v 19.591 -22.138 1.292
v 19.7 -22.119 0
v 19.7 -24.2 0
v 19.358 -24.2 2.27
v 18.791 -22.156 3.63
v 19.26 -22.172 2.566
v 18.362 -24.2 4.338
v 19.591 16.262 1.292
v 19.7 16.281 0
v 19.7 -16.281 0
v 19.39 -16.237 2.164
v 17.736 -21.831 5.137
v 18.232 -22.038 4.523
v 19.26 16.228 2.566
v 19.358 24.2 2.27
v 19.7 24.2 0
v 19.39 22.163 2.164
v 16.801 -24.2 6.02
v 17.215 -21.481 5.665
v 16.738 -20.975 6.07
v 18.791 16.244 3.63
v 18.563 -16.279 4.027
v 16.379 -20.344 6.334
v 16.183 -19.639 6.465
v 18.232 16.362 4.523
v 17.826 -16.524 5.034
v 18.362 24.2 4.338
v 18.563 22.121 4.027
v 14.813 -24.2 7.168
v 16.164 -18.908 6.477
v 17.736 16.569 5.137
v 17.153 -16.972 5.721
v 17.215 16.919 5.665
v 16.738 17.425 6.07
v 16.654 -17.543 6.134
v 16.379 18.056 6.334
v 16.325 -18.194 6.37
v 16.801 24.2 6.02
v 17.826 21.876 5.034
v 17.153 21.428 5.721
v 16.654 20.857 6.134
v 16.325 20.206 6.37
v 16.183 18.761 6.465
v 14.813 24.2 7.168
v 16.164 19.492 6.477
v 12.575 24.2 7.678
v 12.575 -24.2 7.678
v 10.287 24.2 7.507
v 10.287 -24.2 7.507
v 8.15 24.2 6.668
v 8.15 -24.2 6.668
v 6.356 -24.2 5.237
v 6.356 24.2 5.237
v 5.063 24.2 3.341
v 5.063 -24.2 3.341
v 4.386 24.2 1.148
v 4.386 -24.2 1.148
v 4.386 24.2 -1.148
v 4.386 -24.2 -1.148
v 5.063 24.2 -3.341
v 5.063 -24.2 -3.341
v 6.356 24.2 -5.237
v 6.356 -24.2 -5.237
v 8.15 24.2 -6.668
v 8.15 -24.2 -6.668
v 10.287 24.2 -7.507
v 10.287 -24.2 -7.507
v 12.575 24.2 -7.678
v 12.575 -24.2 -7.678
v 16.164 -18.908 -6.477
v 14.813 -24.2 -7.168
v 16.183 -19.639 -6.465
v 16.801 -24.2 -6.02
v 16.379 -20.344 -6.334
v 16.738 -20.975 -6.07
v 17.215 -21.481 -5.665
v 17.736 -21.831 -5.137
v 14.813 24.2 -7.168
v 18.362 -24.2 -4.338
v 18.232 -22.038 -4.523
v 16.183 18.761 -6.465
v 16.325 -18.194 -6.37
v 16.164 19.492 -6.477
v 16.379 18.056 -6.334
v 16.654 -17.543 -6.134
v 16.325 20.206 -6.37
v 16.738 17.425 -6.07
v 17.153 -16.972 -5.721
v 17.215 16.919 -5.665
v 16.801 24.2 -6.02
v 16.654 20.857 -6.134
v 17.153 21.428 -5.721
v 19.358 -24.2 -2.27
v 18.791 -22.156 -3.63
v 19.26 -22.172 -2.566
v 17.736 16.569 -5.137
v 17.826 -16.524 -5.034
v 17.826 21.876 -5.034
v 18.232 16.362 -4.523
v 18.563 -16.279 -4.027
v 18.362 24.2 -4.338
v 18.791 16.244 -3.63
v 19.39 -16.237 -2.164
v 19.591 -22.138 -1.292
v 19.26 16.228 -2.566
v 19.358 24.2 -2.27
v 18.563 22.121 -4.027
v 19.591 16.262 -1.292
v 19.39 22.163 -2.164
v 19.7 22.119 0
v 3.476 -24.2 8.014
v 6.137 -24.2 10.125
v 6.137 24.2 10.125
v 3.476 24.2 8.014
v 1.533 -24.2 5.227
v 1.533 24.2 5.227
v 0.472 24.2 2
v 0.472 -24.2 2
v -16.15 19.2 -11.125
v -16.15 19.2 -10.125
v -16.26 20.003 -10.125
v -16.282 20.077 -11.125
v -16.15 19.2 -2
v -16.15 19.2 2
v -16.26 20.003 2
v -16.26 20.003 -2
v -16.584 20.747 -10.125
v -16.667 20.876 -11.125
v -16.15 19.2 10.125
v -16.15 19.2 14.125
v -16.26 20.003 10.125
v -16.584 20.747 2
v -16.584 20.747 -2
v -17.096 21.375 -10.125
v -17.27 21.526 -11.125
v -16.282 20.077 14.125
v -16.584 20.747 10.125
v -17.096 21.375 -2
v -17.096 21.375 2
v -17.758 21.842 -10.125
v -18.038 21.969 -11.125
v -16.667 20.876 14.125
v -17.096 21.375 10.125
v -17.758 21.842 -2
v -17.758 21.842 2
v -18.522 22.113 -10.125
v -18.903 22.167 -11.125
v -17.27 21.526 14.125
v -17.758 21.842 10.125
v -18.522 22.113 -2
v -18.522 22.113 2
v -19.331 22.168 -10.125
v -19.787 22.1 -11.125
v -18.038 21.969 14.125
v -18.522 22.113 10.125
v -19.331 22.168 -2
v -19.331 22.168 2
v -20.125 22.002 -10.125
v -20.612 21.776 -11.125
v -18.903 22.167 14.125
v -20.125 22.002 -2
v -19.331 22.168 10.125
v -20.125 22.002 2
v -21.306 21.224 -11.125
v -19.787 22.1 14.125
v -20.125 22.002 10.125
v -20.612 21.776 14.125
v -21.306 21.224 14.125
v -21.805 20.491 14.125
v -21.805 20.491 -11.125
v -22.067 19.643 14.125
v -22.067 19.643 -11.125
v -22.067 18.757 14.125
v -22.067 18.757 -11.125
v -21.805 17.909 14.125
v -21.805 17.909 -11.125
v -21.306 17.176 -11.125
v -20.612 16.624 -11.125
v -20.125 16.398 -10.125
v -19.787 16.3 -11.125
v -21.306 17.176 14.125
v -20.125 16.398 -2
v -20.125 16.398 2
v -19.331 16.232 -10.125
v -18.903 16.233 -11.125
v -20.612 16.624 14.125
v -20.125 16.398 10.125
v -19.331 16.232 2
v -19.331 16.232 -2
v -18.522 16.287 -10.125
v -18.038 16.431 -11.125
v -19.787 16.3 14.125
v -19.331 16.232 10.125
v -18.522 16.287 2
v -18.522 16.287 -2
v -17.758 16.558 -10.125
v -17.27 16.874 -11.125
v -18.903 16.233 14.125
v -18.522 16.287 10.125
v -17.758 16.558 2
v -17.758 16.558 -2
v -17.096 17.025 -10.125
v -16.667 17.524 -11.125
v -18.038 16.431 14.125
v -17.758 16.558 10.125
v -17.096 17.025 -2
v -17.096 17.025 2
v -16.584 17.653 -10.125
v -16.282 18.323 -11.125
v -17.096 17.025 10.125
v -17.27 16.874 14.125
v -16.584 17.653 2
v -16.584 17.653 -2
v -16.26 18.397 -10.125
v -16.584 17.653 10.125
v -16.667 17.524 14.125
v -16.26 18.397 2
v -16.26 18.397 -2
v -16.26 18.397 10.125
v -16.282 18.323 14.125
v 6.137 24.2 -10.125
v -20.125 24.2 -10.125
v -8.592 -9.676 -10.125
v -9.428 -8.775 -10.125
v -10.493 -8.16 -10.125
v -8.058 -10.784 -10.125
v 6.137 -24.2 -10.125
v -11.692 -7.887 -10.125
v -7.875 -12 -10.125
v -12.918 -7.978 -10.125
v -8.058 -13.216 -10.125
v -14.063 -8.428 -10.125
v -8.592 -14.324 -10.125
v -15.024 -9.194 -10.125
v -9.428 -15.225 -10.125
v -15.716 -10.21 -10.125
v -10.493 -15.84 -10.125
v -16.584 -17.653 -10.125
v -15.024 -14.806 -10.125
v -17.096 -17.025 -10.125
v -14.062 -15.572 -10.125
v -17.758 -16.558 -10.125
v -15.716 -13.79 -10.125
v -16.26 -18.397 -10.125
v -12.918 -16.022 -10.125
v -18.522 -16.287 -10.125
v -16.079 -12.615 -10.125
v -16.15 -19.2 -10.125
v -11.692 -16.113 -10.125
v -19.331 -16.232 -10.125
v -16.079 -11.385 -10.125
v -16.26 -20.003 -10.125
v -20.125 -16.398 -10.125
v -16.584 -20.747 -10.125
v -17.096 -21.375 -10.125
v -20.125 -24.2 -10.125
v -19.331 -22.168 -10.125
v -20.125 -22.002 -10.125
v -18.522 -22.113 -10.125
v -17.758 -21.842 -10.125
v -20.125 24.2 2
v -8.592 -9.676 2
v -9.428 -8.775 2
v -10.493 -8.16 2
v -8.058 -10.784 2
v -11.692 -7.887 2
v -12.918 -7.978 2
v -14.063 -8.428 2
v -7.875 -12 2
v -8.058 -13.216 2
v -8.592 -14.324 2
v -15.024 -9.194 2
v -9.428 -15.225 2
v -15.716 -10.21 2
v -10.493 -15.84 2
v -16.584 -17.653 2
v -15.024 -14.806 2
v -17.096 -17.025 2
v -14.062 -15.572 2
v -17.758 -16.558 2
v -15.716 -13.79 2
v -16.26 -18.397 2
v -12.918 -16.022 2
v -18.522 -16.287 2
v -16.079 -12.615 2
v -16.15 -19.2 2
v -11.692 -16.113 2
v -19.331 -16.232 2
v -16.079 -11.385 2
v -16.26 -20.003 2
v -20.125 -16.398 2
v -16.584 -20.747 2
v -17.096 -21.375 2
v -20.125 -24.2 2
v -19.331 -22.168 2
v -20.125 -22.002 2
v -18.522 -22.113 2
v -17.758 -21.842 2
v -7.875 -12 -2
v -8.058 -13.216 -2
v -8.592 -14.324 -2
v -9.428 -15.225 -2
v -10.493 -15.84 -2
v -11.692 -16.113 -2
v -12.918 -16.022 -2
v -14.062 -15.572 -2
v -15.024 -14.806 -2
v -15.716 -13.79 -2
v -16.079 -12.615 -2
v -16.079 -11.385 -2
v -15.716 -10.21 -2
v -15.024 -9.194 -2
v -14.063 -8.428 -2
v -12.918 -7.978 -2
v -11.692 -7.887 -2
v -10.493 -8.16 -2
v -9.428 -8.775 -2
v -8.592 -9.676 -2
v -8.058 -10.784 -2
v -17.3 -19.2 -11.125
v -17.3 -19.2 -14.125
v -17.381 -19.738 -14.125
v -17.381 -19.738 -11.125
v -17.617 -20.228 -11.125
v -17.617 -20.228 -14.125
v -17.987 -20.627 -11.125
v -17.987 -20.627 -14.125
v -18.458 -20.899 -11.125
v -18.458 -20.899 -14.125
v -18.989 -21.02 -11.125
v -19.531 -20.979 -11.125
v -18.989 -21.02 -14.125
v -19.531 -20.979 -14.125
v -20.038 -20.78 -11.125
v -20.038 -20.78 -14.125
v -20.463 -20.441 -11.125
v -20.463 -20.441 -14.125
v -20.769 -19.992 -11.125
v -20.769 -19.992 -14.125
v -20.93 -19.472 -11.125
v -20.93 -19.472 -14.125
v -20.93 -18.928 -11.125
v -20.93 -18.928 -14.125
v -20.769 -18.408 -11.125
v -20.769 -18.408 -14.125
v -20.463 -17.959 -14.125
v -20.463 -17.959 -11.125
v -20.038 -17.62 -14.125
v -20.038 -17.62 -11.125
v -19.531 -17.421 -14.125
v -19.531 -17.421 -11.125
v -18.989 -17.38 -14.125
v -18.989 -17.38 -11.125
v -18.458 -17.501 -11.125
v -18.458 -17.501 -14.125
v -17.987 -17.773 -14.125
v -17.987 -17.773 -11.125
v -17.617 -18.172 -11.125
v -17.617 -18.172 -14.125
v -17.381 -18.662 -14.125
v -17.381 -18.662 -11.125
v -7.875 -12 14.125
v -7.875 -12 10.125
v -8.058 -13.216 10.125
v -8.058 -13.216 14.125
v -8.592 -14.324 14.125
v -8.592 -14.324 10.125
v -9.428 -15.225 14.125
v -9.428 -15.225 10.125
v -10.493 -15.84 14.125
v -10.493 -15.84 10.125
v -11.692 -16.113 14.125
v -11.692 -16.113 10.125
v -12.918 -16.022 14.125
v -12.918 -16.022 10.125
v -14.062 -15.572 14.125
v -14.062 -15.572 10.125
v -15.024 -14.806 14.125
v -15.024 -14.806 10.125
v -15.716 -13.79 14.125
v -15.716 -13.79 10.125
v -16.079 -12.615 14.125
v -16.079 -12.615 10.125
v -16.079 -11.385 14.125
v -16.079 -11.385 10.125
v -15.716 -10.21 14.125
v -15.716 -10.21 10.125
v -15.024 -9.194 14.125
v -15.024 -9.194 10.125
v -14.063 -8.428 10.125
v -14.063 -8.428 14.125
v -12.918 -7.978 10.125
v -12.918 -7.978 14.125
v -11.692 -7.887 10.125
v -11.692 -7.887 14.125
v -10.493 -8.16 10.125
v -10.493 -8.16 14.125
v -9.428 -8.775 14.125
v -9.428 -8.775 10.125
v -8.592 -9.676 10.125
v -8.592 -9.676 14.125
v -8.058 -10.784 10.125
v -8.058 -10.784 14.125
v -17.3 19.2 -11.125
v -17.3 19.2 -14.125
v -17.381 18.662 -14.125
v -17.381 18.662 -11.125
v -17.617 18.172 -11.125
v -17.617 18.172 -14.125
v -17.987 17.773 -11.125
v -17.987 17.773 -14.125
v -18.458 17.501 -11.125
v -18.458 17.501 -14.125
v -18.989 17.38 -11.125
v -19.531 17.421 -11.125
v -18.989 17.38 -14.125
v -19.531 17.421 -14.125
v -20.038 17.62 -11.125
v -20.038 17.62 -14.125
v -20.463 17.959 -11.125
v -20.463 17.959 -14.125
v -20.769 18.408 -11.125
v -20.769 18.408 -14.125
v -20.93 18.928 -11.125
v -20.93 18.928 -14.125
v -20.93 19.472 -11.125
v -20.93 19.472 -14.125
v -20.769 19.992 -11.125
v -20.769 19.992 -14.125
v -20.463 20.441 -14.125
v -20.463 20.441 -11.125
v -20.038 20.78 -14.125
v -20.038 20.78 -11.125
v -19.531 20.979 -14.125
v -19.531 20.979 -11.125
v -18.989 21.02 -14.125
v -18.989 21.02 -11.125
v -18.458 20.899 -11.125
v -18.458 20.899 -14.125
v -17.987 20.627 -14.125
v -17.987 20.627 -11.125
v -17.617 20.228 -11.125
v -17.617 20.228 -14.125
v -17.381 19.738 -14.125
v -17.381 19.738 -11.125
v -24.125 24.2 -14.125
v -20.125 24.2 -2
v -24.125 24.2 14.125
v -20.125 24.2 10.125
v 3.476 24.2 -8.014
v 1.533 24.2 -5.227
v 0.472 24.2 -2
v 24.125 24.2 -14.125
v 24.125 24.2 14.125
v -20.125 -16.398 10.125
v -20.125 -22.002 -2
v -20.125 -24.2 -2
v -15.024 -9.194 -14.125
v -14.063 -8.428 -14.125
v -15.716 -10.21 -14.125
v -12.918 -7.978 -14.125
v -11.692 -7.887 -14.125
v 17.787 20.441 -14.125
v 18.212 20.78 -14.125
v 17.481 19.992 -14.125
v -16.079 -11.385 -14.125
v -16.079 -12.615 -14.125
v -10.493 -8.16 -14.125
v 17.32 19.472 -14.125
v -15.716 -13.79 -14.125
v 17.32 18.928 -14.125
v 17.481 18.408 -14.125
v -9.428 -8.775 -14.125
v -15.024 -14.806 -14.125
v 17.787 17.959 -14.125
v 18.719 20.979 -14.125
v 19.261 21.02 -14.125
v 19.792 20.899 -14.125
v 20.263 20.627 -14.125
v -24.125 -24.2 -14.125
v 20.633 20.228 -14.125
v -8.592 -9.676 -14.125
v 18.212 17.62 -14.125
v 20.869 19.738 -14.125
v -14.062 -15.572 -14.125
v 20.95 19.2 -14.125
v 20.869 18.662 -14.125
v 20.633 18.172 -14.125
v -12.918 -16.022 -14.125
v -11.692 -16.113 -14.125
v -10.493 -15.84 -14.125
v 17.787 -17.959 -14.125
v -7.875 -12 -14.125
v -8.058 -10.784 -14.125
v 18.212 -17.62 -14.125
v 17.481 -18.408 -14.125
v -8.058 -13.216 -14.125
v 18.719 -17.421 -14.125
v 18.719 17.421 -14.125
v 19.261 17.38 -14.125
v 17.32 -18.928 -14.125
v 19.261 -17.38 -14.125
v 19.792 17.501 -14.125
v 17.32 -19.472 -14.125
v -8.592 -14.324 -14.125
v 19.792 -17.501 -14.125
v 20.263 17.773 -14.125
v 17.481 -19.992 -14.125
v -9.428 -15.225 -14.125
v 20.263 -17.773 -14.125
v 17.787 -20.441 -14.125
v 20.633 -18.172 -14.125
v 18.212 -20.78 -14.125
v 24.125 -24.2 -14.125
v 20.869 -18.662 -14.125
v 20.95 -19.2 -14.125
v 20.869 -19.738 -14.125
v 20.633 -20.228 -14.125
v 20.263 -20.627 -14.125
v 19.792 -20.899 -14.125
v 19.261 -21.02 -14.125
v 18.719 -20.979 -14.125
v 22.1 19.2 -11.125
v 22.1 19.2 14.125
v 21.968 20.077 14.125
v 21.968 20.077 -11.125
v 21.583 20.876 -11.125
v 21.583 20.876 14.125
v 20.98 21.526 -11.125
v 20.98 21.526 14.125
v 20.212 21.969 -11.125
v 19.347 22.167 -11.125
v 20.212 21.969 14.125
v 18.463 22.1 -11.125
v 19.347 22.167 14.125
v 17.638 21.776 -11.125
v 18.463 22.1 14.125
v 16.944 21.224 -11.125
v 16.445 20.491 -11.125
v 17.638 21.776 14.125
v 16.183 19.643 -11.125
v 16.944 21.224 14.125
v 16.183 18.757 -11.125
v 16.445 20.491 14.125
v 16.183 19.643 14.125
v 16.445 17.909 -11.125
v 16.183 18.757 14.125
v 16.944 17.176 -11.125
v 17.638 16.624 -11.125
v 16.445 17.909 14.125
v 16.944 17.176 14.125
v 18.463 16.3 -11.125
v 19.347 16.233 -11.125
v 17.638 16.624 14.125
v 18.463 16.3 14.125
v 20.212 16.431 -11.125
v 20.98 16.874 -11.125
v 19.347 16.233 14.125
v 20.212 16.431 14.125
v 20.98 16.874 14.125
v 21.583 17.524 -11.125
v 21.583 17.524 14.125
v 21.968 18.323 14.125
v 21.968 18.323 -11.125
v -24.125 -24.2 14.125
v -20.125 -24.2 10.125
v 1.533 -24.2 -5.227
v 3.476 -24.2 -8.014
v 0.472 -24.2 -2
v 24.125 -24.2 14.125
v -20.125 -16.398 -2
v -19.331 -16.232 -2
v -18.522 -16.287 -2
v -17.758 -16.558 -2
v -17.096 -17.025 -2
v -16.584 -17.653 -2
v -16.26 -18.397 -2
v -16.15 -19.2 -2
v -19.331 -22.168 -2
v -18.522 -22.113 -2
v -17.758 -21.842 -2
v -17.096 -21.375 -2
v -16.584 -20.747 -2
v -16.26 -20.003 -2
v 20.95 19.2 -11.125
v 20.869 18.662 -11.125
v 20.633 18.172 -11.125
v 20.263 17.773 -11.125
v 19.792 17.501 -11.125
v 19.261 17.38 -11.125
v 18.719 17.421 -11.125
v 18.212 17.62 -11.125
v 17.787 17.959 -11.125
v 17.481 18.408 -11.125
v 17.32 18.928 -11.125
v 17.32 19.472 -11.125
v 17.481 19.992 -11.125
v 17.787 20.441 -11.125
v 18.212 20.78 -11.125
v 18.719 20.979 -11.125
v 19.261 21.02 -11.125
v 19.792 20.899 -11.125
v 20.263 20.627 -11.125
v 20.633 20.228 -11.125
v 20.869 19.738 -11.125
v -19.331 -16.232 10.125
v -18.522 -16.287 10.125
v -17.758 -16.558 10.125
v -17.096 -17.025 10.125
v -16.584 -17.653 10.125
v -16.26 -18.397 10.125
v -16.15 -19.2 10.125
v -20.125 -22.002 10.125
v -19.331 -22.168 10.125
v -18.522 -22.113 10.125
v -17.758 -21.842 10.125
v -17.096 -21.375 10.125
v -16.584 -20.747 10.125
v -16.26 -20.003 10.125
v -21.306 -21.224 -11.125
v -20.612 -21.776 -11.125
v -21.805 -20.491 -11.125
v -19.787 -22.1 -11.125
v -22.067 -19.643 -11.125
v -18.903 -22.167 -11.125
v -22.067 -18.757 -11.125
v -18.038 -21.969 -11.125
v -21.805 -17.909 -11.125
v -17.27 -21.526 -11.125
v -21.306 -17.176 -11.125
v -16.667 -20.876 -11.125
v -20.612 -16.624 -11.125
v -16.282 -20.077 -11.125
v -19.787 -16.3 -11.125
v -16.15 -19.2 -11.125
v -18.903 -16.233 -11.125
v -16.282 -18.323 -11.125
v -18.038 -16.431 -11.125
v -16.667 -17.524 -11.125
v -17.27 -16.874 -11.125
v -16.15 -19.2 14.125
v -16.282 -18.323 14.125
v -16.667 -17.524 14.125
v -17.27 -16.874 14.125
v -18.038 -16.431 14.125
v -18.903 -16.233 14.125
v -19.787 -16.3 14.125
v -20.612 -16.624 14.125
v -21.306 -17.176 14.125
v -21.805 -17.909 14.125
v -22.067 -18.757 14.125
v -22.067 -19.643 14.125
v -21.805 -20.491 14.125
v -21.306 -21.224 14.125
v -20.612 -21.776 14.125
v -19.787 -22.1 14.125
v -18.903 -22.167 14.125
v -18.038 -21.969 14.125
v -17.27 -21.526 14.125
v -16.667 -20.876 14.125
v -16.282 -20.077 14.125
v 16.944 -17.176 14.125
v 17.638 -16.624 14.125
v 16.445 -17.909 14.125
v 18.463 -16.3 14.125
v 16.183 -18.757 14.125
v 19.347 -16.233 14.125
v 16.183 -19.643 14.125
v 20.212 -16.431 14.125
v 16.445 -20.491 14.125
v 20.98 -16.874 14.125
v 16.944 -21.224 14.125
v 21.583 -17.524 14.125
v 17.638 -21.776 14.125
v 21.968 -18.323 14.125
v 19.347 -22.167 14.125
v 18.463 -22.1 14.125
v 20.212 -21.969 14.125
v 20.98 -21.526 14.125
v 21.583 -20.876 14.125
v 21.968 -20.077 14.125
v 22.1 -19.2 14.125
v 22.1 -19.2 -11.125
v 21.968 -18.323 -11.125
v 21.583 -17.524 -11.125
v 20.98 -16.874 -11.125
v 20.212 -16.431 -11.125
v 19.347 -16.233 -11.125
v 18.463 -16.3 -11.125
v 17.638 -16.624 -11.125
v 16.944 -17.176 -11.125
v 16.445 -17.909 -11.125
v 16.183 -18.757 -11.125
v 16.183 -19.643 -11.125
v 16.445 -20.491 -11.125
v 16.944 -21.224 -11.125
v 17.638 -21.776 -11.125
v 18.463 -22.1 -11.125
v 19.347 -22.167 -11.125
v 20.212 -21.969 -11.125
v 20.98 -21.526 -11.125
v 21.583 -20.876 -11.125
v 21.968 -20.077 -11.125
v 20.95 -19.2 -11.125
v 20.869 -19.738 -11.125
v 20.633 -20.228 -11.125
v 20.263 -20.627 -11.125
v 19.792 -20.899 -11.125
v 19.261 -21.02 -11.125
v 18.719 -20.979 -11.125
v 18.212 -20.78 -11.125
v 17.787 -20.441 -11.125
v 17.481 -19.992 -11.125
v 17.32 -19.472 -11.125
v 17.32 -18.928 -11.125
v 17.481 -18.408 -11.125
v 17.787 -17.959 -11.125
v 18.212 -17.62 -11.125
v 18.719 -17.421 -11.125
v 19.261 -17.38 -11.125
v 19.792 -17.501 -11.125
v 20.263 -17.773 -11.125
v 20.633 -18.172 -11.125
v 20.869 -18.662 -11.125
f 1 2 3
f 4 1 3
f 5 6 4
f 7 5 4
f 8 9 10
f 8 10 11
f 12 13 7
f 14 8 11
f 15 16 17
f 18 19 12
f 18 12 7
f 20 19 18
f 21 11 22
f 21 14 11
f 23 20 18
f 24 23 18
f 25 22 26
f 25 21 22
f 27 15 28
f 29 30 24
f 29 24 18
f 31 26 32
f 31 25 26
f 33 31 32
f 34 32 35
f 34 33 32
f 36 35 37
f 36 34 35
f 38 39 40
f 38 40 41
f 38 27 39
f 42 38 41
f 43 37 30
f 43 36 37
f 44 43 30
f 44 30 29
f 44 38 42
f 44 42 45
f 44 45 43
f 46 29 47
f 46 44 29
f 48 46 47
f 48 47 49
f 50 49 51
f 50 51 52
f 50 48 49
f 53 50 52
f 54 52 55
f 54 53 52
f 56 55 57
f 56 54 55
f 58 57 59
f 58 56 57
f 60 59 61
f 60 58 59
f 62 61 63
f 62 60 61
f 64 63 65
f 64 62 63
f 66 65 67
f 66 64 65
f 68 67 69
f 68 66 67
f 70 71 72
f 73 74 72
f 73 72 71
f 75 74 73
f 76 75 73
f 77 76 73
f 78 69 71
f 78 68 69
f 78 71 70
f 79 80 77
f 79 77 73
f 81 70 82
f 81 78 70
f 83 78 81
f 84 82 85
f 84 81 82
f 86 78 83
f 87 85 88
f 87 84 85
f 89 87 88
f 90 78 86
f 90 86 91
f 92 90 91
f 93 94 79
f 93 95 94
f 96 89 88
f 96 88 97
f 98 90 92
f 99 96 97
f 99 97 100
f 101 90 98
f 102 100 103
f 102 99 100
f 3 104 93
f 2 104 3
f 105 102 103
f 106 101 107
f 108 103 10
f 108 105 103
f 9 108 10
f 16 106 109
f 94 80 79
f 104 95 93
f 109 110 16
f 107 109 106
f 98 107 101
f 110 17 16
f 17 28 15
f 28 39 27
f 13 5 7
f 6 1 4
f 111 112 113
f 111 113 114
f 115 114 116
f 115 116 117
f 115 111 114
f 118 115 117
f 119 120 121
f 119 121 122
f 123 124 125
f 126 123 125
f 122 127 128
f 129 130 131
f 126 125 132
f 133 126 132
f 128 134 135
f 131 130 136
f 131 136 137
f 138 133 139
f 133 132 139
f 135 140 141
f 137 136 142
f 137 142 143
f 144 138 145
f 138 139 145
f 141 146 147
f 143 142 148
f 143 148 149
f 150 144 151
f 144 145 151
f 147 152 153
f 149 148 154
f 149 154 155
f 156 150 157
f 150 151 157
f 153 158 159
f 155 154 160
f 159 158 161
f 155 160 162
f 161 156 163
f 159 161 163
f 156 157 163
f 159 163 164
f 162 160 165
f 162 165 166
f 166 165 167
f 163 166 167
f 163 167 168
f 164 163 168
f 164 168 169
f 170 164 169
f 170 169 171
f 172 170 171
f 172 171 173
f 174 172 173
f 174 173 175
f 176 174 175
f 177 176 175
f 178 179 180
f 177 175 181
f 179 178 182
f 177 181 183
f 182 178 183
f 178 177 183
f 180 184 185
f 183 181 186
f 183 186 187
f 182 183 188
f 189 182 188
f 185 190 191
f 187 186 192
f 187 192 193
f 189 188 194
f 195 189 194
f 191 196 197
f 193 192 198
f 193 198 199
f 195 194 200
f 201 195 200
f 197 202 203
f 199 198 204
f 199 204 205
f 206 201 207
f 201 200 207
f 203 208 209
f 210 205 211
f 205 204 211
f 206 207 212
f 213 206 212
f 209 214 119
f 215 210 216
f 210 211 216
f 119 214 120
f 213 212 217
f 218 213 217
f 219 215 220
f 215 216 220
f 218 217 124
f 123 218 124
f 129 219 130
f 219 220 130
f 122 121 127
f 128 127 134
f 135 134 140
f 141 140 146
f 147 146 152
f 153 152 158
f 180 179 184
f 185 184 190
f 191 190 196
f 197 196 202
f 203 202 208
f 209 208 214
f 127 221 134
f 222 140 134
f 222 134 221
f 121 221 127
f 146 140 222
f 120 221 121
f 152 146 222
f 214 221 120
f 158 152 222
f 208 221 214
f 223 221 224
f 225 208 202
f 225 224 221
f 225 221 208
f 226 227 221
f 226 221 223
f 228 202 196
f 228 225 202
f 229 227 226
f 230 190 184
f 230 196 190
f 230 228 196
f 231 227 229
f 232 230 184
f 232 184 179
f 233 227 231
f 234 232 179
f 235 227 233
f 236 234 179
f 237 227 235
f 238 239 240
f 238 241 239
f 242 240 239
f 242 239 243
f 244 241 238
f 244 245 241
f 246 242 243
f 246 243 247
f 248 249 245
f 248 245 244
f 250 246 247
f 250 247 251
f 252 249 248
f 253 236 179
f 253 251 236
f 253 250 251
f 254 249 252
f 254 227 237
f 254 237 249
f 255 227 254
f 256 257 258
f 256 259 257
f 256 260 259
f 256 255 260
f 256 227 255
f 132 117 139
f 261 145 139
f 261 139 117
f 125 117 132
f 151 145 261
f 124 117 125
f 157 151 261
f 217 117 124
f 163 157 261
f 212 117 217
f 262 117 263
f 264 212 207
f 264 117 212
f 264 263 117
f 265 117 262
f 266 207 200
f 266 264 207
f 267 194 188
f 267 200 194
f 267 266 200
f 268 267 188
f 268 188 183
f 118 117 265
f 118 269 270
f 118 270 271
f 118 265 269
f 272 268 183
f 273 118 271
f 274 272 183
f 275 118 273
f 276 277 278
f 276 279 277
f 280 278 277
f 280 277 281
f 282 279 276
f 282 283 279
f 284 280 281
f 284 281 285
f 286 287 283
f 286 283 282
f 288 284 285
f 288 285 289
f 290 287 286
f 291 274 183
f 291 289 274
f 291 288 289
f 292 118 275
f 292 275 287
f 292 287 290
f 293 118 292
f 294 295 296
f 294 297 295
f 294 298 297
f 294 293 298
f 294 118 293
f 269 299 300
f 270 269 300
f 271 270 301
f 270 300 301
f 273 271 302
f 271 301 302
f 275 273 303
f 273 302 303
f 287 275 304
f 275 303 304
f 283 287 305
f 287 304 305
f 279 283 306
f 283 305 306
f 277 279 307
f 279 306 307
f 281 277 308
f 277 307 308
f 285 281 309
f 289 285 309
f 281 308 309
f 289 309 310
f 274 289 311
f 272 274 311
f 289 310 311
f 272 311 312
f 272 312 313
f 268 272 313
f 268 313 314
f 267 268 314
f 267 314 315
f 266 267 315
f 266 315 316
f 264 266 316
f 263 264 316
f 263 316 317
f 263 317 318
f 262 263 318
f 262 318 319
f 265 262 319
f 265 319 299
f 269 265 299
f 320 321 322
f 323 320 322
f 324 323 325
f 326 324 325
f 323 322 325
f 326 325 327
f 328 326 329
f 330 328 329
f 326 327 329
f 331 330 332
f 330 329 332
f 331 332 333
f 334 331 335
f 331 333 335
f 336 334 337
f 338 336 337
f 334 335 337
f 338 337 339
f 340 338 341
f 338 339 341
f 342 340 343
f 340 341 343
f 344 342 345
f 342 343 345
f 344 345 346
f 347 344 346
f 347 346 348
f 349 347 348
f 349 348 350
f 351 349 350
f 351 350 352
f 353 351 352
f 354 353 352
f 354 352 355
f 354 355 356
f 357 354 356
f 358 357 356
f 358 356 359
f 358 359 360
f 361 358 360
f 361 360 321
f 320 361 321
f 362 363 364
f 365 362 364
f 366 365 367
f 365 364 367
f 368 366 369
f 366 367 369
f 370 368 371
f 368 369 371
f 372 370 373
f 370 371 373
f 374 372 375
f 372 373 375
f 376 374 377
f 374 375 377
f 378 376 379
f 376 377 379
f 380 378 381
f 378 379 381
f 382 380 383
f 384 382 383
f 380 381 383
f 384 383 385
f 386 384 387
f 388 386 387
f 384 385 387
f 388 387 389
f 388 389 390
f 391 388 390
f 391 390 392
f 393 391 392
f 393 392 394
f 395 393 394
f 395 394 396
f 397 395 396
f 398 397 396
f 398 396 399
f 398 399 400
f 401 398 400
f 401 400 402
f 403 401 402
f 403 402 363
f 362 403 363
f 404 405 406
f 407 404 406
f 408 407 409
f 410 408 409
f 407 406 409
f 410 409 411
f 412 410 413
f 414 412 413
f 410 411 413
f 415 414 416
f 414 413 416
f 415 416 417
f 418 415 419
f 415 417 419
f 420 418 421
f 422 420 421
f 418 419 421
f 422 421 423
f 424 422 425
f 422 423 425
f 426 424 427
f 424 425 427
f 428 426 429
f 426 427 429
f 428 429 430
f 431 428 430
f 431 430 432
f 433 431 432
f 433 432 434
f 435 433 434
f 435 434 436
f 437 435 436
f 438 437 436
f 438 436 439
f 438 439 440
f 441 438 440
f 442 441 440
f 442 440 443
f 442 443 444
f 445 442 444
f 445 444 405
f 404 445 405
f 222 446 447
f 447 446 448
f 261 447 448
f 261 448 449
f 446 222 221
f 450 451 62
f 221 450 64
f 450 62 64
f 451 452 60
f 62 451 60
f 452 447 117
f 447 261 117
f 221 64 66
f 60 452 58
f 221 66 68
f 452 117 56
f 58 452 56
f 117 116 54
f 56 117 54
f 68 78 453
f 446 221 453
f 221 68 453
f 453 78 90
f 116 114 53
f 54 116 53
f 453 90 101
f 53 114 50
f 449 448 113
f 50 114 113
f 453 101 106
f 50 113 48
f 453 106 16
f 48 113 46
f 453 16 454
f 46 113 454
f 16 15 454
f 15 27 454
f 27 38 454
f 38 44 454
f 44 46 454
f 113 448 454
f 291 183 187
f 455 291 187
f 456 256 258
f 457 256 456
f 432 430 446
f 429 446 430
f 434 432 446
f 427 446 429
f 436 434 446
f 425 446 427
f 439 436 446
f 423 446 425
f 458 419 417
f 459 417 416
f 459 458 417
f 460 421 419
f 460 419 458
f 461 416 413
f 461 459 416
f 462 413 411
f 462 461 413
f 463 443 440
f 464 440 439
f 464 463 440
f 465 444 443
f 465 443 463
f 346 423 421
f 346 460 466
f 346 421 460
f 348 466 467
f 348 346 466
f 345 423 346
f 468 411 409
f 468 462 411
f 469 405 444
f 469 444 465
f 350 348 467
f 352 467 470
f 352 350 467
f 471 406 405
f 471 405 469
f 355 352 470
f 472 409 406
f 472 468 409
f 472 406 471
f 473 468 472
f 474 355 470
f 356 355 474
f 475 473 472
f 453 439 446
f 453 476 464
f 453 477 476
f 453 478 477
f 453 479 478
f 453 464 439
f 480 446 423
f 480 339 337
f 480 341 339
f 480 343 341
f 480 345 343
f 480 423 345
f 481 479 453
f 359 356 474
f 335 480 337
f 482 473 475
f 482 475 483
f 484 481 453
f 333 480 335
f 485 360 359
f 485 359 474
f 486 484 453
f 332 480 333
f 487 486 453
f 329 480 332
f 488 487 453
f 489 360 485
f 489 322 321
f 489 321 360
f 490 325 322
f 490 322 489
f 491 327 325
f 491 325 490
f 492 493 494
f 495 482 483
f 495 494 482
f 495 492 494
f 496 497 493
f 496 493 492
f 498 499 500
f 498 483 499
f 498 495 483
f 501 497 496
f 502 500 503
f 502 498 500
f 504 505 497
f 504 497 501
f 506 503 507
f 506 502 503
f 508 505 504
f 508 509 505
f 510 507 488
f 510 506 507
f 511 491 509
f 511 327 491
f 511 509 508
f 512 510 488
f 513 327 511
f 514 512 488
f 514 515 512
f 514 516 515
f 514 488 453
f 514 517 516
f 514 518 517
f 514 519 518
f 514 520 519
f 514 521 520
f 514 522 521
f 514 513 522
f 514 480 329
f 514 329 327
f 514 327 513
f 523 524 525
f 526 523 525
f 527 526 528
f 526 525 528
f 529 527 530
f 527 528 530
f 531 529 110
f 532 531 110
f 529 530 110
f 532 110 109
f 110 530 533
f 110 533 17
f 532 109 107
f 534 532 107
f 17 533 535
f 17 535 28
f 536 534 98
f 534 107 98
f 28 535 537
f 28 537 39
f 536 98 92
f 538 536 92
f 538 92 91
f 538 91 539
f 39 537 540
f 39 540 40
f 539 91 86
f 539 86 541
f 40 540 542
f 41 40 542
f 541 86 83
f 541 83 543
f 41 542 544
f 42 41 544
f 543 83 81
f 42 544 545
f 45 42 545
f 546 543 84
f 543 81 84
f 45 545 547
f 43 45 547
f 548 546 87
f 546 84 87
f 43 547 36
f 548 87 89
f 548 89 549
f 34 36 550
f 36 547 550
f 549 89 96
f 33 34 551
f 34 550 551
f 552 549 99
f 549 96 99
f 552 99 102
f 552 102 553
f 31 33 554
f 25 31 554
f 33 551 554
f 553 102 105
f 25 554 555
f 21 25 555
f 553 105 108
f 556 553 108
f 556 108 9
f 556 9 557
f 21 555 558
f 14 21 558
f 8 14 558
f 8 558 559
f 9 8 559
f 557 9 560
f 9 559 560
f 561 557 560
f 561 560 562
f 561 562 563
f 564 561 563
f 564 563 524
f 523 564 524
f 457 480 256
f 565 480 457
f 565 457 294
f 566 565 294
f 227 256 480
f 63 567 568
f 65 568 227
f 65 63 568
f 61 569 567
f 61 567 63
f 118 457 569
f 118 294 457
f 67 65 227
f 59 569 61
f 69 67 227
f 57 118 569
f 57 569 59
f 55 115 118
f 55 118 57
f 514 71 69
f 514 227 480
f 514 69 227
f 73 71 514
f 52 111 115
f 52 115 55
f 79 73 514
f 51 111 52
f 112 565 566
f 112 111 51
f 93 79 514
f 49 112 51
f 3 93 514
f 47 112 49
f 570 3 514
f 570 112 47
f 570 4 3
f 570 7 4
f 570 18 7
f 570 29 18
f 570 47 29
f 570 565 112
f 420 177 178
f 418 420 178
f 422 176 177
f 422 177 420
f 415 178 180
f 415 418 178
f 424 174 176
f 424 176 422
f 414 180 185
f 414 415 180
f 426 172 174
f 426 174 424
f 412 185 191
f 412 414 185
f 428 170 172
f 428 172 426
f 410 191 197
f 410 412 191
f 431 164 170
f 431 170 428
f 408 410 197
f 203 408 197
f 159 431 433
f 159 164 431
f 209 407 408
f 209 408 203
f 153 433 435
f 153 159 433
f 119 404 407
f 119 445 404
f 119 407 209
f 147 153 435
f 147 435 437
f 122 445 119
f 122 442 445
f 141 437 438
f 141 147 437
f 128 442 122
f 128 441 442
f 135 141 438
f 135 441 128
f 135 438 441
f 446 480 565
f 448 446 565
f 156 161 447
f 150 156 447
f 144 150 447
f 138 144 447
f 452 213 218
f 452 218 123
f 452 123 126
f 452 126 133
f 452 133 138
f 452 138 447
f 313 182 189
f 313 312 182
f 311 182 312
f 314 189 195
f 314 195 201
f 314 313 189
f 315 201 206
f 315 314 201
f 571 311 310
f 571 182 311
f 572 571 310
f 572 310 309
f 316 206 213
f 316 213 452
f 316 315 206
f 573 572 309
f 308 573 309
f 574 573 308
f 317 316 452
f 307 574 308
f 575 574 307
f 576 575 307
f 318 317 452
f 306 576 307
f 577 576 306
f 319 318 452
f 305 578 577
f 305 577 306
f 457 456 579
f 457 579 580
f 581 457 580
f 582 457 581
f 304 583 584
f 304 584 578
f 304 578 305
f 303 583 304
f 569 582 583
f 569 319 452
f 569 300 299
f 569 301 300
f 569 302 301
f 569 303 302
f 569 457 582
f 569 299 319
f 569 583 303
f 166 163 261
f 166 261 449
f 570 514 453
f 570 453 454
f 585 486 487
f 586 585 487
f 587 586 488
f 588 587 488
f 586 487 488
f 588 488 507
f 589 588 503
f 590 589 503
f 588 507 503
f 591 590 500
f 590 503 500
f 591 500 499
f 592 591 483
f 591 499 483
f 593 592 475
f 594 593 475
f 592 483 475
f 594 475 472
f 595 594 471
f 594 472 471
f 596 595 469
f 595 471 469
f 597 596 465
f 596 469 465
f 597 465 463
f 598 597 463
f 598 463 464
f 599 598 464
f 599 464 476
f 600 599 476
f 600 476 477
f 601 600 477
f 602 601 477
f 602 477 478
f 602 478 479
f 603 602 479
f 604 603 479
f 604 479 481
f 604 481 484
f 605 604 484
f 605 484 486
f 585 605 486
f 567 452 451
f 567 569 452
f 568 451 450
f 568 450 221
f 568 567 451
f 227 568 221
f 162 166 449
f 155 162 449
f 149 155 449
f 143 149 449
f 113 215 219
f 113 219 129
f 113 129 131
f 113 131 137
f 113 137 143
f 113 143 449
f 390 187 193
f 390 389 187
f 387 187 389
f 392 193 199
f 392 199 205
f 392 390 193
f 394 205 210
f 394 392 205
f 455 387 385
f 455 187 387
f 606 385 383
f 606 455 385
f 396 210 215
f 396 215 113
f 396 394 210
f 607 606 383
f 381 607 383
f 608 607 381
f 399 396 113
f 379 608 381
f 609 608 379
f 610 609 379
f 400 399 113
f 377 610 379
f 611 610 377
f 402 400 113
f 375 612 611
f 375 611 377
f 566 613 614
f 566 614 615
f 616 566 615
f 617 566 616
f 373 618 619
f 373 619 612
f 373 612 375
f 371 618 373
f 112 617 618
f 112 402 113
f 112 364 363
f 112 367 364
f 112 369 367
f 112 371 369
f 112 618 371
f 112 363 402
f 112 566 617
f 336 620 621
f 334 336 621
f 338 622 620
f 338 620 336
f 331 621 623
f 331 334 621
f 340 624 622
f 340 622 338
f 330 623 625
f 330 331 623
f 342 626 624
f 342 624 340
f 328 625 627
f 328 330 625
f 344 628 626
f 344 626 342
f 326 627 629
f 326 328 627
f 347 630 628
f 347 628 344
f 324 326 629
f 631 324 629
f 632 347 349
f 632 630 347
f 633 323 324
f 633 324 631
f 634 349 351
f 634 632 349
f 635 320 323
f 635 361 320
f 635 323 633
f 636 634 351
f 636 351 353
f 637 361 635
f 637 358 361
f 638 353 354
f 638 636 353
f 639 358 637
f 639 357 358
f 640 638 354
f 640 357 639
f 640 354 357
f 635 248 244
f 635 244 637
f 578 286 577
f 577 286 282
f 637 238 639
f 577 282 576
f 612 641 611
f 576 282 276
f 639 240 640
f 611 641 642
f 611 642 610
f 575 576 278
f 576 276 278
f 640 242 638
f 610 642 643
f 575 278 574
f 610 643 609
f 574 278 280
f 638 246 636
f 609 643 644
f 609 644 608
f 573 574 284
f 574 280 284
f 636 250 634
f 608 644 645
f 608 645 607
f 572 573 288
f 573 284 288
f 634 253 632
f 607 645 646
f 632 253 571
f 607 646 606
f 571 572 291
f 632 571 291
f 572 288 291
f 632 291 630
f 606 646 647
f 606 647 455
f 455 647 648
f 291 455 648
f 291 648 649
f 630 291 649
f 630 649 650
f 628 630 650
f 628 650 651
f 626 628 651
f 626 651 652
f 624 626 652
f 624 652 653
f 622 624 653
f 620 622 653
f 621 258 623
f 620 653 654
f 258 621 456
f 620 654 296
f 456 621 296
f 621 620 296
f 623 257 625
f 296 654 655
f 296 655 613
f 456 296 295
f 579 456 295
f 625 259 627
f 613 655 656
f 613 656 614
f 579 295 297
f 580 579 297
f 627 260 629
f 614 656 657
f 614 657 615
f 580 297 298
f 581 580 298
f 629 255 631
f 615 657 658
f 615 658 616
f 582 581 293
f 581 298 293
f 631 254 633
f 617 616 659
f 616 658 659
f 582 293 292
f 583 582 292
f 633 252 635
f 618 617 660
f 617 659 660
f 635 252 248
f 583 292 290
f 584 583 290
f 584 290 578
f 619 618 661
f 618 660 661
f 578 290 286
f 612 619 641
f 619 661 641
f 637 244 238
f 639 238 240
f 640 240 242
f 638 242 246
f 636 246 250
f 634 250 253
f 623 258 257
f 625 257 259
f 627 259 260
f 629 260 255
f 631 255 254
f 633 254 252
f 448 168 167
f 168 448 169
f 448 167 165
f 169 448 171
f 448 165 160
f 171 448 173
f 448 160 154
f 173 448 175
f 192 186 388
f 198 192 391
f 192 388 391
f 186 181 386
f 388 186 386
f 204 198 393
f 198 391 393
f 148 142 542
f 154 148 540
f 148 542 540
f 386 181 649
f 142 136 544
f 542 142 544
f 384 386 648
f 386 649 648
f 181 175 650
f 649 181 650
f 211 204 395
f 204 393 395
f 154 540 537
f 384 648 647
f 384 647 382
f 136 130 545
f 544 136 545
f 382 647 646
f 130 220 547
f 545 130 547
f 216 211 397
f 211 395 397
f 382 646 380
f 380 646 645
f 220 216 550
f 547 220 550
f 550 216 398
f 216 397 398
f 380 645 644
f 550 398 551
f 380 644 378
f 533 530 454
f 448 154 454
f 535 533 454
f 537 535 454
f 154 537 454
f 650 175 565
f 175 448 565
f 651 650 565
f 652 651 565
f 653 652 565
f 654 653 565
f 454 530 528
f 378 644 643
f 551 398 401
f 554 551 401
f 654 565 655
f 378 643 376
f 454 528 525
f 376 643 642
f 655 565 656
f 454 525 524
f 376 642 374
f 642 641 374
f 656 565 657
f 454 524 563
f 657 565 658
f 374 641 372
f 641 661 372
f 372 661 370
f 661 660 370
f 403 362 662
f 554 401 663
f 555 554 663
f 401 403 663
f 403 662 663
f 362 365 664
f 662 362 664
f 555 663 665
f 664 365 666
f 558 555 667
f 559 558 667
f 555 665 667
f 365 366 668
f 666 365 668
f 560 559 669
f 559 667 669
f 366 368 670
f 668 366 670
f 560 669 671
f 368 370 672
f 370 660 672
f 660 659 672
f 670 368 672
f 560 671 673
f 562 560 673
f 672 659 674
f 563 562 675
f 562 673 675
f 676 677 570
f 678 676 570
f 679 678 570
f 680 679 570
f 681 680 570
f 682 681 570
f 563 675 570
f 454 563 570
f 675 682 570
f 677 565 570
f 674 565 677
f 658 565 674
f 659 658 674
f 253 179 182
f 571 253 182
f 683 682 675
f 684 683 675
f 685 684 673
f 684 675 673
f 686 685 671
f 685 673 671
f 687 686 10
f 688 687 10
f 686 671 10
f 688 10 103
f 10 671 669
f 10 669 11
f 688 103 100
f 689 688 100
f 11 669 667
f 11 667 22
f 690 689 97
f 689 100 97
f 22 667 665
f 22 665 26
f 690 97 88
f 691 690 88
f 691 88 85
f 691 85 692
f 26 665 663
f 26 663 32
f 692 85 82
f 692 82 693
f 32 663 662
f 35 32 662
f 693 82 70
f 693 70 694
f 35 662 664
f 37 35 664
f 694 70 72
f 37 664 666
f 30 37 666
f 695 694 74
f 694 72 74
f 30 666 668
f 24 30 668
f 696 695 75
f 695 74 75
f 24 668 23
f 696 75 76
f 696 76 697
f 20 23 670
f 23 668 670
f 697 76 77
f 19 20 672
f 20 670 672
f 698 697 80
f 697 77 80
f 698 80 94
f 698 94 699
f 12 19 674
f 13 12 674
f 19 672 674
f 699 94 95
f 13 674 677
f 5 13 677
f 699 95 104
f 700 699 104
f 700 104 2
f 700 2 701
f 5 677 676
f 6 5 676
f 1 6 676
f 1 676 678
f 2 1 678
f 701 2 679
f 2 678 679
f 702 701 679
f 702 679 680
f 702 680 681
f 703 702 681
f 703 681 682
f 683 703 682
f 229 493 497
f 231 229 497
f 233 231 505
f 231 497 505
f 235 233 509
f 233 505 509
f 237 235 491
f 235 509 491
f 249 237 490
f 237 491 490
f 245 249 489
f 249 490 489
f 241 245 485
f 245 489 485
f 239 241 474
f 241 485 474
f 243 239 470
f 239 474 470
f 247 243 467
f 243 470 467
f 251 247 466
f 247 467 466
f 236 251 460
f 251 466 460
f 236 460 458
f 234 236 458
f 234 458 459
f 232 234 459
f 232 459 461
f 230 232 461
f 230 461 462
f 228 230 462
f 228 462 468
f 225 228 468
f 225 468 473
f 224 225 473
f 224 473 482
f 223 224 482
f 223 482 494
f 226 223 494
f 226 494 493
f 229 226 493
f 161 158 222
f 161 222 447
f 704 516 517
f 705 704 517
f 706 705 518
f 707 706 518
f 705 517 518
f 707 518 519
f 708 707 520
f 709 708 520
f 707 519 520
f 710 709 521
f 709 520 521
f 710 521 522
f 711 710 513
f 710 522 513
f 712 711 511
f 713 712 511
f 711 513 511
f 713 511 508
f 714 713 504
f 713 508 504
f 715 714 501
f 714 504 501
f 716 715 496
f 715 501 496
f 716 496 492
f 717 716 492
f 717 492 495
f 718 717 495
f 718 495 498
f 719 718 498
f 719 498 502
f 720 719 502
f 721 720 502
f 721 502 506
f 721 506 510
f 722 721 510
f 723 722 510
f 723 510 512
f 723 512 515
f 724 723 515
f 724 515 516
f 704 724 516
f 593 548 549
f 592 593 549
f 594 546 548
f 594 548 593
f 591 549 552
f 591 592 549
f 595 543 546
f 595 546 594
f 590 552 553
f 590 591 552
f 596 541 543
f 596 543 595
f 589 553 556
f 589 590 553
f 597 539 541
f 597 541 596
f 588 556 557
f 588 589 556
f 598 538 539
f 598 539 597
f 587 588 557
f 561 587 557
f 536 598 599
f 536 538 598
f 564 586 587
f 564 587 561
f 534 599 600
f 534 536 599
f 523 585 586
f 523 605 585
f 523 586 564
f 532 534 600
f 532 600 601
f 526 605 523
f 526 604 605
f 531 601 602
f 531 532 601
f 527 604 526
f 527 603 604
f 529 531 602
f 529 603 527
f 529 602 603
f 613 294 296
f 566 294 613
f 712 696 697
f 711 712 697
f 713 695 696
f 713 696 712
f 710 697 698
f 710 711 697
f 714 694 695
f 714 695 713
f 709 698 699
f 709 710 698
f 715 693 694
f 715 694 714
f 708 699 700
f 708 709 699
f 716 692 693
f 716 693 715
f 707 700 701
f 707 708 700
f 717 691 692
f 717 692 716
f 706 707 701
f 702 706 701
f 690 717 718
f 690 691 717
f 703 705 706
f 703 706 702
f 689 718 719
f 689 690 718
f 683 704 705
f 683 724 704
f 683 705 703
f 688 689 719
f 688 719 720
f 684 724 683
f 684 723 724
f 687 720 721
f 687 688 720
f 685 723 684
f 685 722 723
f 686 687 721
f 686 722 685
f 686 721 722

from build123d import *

# Parameters (mm, degrees)
F2_W     = 48.25
F2_H     = 28.25
F2_R     = 7.7
F3_DEPTH = 24.2
F5_R     = 2.975
F6_DEPTH = 25.25
F4_R     = 1.825
F7_DEPTH = 28.25
F4_R_2   = 4.125
F8_DEPTH = 28.25


# Not quite as in the source:
# - a feature names something its author has since deleted; it is built from what else it names


with BuildPart() as f3:
    # F2 (on Front) → F3 (new body, symmetric)
    with BuildSketch(Plane.XZ):
        Rectangle(F2_W, F2_H)
        with BuildLine():
            ThreePointArc((23.5277925033, 2), (23.6568686252, 1.0037000824), (23.7, 0))
            ThreePointArc((23.7, 0), (23.6568686252, -1.0037000824), (23.5277925033, -2))
            ThreePointArc((23.5277925033, -2), (22.3372126342, -5.4801491728), (20.125, -8.4186920005))
            Line((20.125, -8.4186920005), (20.125, -10.125))
            Line((20.125, -10.125), (17.8629663994, -10.125))
            ThreePointArc((17.8629663994, -10.125), (15.9935594213, -10.9973398215), (14, -11.5277925033))
            ThreePointArc((14, -11.5277925033), (12, -11.7), (10, -11.5277925033))
            ThreePointArc((10, -11.5277925033), (8.0064405787, -10.9973398215), (6.1370336006, -10.125))
            Line((6.1370336006, -10.125), (-20.125, -10.125))
            Line((-20.125, -10.125), (-20.125, -2))
            Line((-20.125, -2), (-20.125, 2))
            Line((-20.125, 2), (-20.125, 10.125))
            Line((-20.125, 10.125), (6.1370336006, 10.125))
            ThreePointArc((6.1370336006, 10.125), (8.0064405787, 10.9973398215), (10, 11.5277925033))
            ThreePointArc((10, 11.5277925033), (12, 11.7), (14, 11.5277925033))
            ThreePointArc((14, 11.5277925033), (15.9935594213, 10.9973398215), (17.8629663994, 10.125))
            Line((17.8629663994, 10.125), (20.125, 10.125))
            Line((20.125, 10.125), (20.125, 8.4186920005))
            ThreePointArc((20.125, 8.4186920005), (22.3372126342, 5.4801491728), (23.5277925033, 2))
        make_face(mode=Mode.SUBTRACT)
        with BuildLine():
            Line((14, 10.125), (14, 11.5277925033))
            ThreePointArc((14, 11.5277925033), (12, 11.7), (10, 11.5277925033))
            Line((10, 11.5277925033), (10, 10.125))
            Line((10, 10.125), (14, 10.125))
        make_face()
        with BuildLine():
            Line((20.125, 2), (20.125, 8.4186920005))
            ThreePointArc((20.125, 8.4186920005), (19.045826619, 9.3405742466), (17.8629663994, 10.125))
            Line((17.8629663994, 10.125), (14, 10.125))
            Line((14, 10.125), (10, 10.125))
            Line((10, 10.125), (6.1370336006, 10.125))
            ThreePointArc((6.1370336006, 10.125), (2.4024206149, 6.6915222444), (0.4722074967, 2))
            ThreePointArc((0.4722074967, 2), (0.3, 0), (0.4722074967, -2))
            ThreePointArc((0.4722074967, -2), (2.4024206149, -6.6915222444), (6.1370336006, -10.125))
            Line((6.1370336006, -10.125), (10, -10.125))
            Line((10, -10.125), (14, -10.125))
            Line((14, -10.125), (17.8629663994, -10.125))
            ThreePointArc((17.8629663994, -10.125), (19.045826619, -9.3405742466), (20.125, -8.4186920005))
            Line((20.125, -8.4186920005), (20.125, -2))
            Line((20.125, -2), (20.125, 2))
        make_face()
        with Locations((12, 0)):
            Circle(F2_R, mode=Mode.SUBTRACT)
        with BuildLine():
            ThreePointArc((10, -11.5277925033), (12, -11.7), (14, -11.5277925033))
            Line((14, -11.5277925033), (14, -10.125))
            Line((14, -10.125), (10, -10.125))
            Line((10, -10.125), (10, -11.5277925033))
        make_face()
        with BuildLine():
            ThreePointArc((0.4722074967, -2), (0.3, 0), (0.4722074967, 2))
            Line((0.4722074967, 2), (-20.125, 2))
            Line((-20.125, 2), (-20.125, -2))
            Line((-20.125, -2), (0.4722074967, -2))
        make_face()
        with BuildLine():
            ThreePointArc((23.5277925033, -2), (23.6568686252, -1.0037000824), (23.7, 0))
            ThreePointArc((23.7, 0), (23.6568686252, 1.0037000824), (23.5277925033, 2))
            Line((23.5277925033, 2), (20.125, 2))
            Line((20.125, 2), (20.125, -2))
            Line((20.125, -2), (23.5277925033, -2))
        make_face()
        with BuildLine():
            Line((20.125, 2), (23.5277925033, 2))
            ThreePointArc((23.5277925033, 2), (22.3372126342, 5.4801491728), (20.125, 8.4186920005))
            Line((20.125, 8.4186920005), (20.125, 2))
        make_face()
        with BuildLine():
            ThreePointArc((20.125, -8.4186920005), (22.3372126342, -5.4801491728), (23.5277925033, -2))
            Line((23.5277925033, -2), (20.125, -2))
            Line((20.125, -2), (20.125, -8.4186920005))
        make_face()
        with BuildLine():
            Line((14, 10.125), (17.8629663994, 10.125))
            ThreePointArc((17.8629663994, 10.125), (15.9935594213, 10.9973398215), (14, 11.5277925033))
            Line((14, 11.5277925033), (14, 10.125))
        make_face()
        with BuildLine():
            Line((10, 10.125), (10, 11.5277925033))
            ThreePointArc((10, 11.5277925033), (8.0064405787, 10.9973398215), (6.1370336006, 10.125))
            Line((6.1370336006, 10.125), (10, 10.125))
        make_face()
        with BuildLine():
            ThreePointArc((14, -11.5277925033), (15.9935594213, -10.9973398215), (17.8629663994, -10.125))
            Line((17.8629663994, -10.125), (14, -10.125))
            Line((14, -10.125), (14, -11.5277925033))
        make_face()
        with BuildLine():
            ThreePointArc((6.1370336006, -10.125), (8.0064405787, -10.9973398215), (10, -11.5277925033))
            Line((10, -11.5277925033), (10, -10.125))
            Line((10, -10.125), (6.1370336006, -10.125))
        make_face()
        with BuildLine():
            ThreePointArc((17.8629663994, 10.125), (19.045826619, 9.3405742466), (20.125, 8.4186920005))
            Line((20.125, 8.4186920005), (20.125, 10.125))
            Line((20.125, 10.125), (17.8629663994, 10.125))
        make_face()
        with BuildLine():
            Line((20.125, -10.125), (20.125, -8.4186920005))
            ThreePointArc((20.125, -8.4186920005), (19.045826619, -9.3405742466), (17.8629663994, -10.125))
            Line((17.8629663994, -10.125), (20.125, -10.125))
        make_face()
    extrude(amount=F3_DEPTH, both=True)

    # F5 (on face) → F6 (cut)
    with BuildSketch(Plane.XY.offset(14.125)):
        with Locations((-19.125, 19.2)):
            Circle(F5_R)
        with Locations((19.125, -19.2)):
            Circle(F5_R)
        with Locations((-19.125, -19.2)):
            Circle(F5_R)
        with Locations((19.125, 19.2)):
            Circle(F5_R)
    extrude(amount=-F6_DEPTH, mode=Mode.SUBTRACT)

    # F4 (on face) → F7 (cut)
    with BuildSketch(Plane(origin=(0, 0, -14.125), x_dir=(1, 0, 0), z_dir=(0, 0, -1))):
        with Locations((-19.125, 19.2)):
            Circle(F4_R)
        with Locations((19.125, 19.2)):
            Circle(F4_R)
        with Locations((19.125, -19.2)):
            Circle(F4_R)
        with Locations((-19.125, -19.2)):
            Circle(F4_R)
    extrude(amount=-F7_DEPTH, mode=Mode.SUBTRACT)

    # F4 (on face) → F8 (cut)
    with BuildSketch(Plane(origin=(0, 0, -14.125), x_dir=(1, 0, 0), z_dir=(0, 0, -1))):
        with Locations((-12, 12)):
            Circle(F4_R_2)
    extrude(amount=-F8_DEPTH, mode=Mode.SUBTRACT)


solid = f3.part
